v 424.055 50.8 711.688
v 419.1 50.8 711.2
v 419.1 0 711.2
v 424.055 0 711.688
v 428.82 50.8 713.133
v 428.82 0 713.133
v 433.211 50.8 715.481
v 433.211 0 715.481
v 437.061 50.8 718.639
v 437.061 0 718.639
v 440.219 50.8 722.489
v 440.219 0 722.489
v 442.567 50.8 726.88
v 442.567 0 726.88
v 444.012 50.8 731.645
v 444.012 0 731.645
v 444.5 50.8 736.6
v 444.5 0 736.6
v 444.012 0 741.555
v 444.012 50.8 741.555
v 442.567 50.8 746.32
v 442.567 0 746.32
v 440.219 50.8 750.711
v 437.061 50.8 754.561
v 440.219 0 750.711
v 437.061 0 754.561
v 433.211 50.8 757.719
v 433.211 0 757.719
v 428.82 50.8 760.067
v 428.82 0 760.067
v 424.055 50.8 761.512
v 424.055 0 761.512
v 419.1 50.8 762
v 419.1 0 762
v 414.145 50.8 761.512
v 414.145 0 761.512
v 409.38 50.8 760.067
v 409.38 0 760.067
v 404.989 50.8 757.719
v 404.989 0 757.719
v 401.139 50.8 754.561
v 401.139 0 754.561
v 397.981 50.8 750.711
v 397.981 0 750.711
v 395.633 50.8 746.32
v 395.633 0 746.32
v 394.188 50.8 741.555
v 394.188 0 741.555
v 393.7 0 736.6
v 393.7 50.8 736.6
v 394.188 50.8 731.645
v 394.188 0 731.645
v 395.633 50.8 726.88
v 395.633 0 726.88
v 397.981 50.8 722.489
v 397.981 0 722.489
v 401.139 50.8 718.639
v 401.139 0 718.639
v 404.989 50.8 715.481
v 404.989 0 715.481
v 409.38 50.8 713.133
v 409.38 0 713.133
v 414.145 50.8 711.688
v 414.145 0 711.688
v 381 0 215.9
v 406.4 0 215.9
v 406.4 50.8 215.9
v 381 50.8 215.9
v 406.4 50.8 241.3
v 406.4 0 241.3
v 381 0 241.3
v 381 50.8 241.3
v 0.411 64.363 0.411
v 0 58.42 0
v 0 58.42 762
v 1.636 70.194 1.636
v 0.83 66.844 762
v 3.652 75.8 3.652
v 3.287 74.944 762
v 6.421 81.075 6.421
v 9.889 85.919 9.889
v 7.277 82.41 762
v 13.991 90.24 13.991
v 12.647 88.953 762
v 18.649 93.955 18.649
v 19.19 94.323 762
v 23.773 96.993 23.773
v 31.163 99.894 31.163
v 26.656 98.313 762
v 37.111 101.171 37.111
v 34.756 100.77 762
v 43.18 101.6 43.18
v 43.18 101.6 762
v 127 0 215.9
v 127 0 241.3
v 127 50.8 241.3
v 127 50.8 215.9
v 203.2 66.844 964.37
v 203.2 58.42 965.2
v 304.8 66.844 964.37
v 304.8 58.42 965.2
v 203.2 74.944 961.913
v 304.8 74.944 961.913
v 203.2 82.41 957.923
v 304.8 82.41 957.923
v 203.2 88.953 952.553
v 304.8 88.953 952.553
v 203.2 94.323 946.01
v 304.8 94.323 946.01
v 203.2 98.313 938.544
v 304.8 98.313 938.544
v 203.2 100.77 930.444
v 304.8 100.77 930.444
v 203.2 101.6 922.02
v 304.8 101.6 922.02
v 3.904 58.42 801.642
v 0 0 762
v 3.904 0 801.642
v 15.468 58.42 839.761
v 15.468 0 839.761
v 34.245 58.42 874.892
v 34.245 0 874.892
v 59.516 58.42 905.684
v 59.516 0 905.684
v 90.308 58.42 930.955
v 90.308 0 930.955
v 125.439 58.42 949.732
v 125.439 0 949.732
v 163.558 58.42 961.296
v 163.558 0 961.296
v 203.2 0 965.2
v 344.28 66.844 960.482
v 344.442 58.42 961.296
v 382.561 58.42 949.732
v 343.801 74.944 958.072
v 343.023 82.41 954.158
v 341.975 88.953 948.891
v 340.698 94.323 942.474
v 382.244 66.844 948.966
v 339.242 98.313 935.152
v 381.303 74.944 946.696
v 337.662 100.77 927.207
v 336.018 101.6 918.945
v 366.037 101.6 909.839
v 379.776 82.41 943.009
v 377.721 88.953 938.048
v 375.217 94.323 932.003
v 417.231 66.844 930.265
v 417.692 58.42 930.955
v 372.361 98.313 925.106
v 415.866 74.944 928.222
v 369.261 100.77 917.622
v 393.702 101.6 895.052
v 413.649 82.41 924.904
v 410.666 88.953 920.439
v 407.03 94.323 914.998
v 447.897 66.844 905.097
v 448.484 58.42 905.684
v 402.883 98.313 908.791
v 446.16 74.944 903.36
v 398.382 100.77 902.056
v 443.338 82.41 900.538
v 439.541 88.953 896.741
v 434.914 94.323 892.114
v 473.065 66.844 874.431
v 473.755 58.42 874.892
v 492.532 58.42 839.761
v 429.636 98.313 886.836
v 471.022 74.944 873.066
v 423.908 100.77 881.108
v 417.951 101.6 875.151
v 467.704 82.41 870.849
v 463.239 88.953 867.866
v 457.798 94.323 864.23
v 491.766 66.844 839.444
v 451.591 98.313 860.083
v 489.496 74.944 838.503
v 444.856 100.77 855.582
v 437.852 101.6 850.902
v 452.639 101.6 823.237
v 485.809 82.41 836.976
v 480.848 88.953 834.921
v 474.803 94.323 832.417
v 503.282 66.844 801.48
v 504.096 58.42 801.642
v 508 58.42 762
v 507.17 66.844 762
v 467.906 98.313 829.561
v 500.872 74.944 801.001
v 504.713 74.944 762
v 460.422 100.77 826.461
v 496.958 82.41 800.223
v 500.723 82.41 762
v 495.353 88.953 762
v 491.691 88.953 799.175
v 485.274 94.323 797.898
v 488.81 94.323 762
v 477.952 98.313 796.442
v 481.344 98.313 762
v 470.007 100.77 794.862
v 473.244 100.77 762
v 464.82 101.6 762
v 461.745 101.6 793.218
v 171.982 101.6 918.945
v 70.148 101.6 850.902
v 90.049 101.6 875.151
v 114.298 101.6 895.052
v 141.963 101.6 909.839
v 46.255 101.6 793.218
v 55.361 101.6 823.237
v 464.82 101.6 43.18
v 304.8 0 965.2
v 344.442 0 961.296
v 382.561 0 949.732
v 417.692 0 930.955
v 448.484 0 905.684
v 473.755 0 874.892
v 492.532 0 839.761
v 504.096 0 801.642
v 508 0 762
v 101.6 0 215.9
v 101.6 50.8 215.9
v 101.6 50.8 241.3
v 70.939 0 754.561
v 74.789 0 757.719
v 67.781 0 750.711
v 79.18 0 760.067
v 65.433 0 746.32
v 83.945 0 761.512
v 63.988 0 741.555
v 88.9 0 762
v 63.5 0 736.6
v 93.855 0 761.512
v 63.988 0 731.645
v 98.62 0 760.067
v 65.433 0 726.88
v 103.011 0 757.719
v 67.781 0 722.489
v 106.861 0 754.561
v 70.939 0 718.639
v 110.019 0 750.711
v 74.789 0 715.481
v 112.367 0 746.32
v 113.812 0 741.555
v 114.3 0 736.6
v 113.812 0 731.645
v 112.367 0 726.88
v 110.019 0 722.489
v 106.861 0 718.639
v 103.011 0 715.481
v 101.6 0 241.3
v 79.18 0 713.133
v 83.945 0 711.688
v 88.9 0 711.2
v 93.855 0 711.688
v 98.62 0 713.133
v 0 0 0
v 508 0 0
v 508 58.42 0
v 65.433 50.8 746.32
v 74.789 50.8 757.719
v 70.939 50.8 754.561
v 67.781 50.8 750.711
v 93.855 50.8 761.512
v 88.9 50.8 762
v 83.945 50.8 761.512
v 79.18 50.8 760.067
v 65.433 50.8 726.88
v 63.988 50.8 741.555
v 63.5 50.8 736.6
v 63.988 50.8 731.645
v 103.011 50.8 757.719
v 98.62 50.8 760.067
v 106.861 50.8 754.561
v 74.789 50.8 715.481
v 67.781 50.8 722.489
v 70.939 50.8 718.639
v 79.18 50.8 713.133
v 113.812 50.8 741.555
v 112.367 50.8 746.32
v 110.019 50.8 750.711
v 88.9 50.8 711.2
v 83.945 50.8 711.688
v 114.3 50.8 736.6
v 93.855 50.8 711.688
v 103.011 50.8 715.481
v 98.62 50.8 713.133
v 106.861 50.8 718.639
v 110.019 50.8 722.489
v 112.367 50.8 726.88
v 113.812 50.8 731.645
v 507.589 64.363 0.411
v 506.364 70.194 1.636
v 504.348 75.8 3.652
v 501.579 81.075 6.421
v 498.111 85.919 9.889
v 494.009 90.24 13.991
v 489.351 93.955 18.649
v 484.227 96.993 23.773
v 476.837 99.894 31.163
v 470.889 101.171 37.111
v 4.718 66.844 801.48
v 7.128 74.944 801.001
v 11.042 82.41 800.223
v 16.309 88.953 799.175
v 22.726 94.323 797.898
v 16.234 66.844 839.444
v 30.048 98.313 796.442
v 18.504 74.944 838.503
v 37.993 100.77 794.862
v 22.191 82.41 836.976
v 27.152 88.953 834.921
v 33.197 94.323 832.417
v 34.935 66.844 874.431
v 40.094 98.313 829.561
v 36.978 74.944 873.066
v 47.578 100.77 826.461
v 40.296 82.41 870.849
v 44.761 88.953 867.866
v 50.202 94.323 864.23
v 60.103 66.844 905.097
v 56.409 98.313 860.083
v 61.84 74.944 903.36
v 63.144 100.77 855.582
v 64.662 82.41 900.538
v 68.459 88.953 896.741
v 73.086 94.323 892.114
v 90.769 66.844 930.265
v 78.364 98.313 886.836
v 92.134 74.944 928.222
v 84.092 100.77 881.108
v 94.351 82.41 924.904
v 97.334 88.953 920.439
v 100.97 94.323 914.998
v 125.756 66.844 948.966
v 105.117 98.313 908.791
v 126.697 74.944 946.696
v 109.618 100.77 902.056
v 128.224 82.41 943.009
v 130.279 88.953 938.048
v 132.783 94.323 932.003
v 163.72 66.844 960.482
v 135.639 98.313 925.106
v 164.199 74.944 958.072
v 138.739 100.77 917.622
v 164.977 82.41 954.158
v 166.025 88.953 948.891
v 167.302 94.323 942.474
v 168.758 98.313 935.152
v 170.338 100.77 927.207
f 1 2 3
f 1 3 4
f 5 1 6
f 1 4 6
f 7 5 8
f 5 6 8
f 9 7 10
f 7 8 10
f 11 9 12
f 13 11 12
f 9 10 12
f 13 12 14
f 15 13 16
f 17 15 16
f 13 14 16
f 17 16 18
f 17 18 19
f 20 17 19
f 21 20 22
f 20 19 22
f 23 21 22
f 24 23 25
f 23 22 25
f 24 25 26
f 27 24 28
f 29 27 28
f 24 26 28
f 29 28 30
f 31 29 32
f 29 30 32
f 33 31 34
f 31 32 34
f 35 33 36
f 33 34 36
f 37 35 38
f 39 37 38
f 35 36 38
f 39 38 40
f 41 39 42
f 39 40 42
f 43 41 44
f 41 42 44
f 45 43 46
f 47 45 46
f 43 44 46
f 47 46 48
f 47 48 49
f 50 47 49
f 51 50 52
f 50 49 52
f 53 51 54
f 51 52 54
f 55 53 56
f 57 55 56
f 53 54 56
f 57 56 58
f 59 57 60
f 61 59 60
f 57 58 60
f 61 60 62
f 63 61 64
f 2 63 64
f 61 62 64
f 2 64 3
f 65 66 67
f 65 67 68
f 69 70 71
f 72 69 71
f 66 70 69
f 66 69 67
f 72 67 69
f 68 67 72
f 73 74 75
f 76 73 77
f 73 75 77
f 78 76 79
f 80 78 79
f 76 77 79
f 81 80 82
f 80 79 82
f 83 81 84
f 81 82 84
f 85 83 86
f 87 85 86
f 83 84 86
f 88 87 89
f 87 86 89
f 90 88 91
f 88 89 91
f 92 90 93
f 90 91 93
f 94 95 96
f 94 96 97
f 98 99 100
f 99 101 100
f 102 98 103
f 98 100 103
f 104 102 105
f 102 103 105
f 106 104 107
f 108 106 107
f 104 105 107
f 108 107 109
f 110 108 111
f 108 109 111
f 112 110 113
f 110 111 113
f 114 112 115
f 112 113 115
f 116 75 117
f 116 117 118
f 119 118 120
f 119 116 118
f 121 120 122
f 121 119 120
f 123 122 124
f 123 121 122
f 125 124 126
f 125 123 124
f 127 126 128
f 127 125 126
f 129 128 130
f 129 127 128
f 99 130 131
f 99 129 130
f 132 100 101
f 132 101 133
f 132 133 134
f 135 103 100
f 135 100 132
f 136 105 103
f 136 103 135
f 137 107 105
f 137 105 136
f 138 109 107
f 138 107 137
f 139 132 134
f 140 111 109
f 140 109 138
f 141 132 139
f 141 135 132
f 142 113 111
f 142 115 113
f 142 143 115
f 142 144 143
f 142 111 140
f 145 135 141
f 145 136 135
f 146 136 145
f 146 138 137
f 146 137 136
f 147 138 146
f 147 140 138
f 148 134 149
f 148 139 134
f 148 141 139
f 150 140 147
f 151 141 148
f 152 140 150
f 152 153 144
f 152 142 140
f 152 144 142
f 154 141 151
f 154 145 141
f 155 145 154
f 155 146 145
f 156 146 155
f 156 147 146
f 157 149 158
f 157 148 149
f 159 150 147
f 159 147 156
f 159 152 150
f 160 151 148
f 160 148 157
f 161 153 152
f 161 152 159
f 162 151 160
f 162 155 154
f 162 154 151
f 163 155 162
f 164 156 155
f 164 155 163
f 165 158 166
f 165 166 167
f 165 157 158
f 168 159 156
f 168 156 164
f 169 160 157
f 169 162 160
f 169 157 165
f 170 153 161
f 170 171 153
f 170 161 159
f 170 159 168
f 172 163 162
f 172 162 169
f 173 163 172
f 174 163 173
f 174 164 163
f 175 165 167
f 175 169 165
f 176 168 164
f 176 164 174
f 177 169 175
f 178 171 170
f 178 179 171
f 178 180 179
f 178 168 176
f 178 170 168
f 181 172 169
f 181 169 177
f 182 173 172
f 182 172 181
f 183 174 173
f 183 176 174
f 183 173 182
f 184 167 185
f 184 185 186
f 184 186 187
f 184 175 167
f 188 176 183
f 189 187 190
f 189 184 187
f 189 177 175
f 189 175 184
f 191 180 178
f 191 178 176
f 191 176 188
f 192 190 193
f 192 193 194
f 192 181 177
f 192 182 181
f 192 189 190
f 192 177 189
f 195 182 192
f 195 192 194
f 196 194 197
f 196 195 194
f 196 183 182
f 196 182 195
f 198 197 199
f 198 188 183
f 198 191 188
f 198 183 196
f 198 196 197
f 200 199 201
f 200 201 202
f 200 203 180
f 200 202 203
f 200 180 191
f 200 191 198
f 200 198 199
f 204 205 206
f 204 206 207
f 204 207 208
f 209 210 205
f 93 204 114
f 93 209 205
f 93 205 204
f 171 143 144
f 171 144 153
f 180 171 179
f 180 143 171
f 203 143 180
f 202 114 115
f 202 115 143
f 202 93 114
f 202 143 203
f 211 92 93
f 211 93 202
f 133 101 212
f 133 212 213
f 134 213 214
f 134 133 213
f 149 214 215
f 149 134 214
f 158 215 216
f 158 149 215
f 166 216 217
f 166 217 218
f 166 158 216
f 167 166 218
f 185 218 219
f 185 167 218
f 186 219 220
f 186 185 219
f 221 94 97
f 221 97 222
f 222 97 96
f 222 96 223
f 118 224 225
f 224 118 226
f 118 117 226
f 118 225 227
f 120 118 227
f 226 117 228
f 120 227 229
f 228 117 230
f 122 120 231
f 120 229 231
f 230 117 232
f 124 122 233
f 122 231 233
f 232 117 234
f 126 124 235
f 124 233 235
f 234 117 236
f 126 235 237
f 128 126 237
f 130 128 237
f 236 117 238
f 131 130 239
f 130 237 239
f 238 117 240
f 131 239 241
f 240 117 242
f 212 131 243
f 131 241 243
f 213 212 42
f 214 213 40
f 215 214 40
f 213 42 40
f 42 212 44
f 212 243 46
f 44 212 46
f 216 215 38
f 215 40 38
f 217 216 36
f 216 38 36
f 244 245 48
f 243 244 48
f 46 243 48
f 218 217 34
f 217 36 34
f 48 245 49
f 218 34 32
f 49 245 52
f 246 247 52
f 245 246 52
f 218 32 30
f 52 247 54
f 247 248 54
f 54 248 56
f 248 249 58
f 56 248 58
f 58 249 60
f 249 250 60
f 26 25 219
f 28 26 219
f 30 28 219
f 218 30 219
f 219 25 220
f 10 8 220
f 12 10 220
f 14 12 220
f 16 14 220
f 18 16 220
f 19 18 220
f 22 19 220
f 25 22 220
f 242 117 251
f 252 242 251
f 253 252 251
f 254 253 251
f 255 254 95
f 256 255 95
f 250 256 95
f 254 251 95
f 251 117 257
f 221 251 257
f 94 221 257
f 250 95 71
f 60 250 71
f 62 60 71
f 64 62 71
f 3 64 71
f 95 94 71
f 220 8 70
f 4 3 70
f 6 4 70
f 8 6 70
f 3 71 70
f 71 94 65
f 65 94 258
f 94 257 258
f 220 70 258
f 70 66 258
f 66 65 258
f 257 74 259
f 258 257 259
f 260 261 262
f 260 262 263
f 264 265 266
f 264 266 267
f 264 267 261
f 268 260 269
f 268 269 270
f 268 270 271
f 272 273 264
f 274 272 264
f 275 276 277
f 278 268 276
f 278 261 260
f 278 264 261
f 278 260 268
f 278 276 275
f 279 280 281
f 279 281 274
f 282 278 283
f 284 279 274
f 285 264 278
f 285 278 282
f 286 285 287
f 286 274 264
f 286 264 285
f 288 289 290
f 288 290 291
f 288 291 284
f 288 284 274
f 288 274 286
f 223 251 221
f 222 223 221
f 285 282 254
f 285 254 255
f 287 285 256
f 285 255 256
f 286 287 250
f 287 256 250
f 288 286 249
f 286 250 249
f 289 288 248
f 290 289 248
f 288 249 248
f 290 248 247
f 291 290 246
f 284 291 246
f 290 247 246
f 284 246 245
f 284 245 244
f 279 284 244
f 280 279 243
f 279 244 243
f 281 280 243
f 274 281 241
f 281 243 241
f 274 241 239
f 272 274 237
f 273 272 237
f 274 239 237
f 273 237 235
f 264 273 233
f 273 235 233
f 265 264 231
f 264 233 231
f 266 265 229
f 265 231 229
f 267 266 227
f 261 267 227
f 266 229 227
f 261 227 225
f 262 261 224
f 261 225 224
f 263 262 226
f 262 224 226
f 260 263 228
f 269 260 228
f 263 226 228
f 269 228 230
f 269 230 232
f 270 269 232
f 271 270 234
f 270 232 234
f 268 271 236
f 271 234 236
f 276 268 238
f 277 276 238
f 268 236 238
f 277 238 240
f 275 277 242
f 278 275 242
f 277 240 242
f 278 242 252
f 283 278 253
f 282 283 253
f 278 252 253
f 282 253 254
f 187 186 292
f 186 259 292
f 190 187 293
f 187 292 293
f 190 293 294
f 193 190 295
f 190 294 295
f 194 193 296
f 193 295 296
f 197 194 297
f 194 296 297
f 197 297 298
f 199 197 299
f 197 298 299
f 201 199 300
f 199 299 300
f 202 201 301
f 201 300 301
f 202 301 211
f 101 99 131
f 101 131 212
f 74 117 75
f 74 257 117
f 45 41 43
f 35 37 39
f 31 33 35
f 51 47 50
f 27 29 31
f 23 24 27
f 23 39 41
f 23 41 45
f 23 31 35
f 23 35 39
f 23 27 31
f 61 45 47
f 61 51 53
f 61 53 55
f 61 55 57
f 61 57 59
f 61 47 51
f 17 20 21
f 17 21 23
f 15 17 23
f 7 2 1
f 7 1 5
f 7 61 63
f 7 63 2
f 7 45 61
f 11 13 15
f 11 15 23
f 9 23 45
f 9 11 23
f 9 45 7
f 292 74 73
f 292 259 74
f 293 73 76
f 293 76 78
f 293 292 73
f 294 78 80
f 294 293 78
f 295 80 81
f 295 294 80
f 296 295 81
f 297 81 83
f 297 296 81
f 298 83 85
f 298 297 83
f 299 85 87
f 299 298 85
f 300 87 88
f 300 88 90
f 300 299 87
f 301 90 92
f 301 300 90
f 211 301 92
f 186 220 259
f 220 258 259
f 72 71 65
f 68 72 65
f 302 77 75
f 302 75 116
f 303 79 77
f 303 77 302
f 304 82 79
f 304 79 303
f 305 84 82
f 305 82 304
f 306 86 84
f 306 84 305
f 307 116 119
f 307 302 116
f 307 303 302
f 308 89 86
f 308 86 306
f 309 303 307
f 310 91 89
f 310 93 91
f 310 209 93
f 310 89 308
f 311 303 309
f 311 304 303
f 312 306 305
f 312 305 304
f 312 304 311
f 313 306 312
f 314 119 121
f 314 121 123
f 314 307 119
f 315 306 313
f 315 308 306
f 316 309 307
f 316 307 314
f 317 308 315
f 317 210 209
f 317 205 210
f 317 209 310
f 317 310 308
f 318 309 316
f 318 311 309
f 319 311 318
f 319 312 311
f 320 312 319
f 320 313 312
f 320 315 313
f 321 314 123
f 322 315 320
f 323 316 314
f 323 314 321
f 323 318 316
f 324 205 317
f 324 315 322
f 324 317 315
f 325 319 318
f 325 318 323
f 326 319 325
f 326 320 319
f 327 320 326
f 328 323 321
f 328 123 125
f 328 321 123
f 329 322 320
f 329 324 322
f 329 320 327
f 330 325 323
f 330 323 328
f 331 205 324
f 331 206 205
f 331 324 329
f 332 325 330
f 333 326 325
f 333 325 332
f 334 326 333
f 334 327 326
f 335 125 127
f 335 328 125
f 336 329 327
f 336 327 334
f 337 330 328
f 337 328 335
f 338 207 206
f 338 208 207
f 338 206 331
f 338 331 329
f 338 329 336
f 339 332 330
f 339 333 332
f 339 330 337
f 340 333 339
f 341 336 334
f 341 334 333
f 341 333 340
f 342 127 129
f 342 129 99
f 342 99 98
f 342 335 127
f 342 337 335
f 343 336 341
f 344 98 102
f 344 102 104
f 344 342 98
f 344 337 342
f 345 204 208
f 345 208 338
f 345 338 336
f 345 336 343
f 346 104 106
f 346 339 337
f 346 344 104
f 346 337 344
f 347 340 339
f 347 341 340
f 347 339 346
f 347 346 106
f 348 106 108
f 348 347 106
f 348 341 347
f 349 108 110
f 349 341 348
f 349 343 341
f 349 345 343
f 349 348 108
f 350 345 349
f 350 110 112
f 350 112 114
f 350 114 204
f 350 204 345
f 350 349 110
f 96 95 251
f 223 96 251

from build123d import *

# Parameters (mm, degrees)
SKETCH2_W           = 508
SKETCH2_H           = 101.6
BOSS_EXTRUDE2_DEPTH = 965.2
SKETCH3_R           = 25.4
SKETCH3_W           = 25.4
SKETCH3_H           = 25.4
CUT_EXTRUDE1_DEPTH  = 50.8
FILLET1_R           = 203.2
FILLET2_R           = 203.2
FILLET4_R           = 43.18


with BuildPart() as part:
    # Sketch2 → Boss-Extrude2 (new body)
    with BuildSketch(Plane.XY):
        with Locations((254, 50.8)):
            Rectangle(SKETCH2_W, SKETCH2_H)
    extrude(amount=BOSS_EXTRUDE2_DEPTH)

    # Sketch3 → Cut-Extrude1 (cut)
    with BuildSketch(Plane(origin=(0, 0, 0), x_dir=(-1, 0, 0), z_dir=(0, -1, 0))):
        with Locations(Location((-88.9, -736.6, 0), (0, 0, 90))):
            Circle(SKETCH3_R)
        with Locations(Location((-419.1, -736.6, 0), (0, 0, 90))):
            Circle(SKETCH3_R)
        with Locations((-393.7, -228.6)):
            Rectangle(SKETCH3_W, SKETCH3_H)
        with Locations((-114.3, -228.6)):
            Rectangle(SKETCH3_W, SKETCH3_H)
    extrude(amount=-CUT_EXTRUDE1_DEPTH, mode=Mode.SUBTRACT)

    # Fillet1
    fillet1_edges = [part.edges().sort_by_distance(p)[0] for p in [
        (0, 50.8, 965.2),
    ]]
    fillet(fillet1_edges, radius=FILLET1_R)

    # Fillet2
    fillet2_edges = [part.edges().sort_by_distance(p)[0] for p in [
        (508, 50.8, 965.2),
    ]]
    fillet(fillet2_edges, radius=FILLET2_R)

    # Fillet4
    fillet4_edges = [part.edges().sort_by_distance(p)[0] for p in [
        (254, 101.6, 965.2),
        (0, 101.6, 381),
        (59.515902063, 101.6, 905.684097937),
        (508, 101.6, 381),
        (254, 101.6, 0),
        (448.484097937, 101.6, 905.684097937),
    ]]
    fillet(fillet4_edges, radius=FILLET4_R)


solid = part.part
